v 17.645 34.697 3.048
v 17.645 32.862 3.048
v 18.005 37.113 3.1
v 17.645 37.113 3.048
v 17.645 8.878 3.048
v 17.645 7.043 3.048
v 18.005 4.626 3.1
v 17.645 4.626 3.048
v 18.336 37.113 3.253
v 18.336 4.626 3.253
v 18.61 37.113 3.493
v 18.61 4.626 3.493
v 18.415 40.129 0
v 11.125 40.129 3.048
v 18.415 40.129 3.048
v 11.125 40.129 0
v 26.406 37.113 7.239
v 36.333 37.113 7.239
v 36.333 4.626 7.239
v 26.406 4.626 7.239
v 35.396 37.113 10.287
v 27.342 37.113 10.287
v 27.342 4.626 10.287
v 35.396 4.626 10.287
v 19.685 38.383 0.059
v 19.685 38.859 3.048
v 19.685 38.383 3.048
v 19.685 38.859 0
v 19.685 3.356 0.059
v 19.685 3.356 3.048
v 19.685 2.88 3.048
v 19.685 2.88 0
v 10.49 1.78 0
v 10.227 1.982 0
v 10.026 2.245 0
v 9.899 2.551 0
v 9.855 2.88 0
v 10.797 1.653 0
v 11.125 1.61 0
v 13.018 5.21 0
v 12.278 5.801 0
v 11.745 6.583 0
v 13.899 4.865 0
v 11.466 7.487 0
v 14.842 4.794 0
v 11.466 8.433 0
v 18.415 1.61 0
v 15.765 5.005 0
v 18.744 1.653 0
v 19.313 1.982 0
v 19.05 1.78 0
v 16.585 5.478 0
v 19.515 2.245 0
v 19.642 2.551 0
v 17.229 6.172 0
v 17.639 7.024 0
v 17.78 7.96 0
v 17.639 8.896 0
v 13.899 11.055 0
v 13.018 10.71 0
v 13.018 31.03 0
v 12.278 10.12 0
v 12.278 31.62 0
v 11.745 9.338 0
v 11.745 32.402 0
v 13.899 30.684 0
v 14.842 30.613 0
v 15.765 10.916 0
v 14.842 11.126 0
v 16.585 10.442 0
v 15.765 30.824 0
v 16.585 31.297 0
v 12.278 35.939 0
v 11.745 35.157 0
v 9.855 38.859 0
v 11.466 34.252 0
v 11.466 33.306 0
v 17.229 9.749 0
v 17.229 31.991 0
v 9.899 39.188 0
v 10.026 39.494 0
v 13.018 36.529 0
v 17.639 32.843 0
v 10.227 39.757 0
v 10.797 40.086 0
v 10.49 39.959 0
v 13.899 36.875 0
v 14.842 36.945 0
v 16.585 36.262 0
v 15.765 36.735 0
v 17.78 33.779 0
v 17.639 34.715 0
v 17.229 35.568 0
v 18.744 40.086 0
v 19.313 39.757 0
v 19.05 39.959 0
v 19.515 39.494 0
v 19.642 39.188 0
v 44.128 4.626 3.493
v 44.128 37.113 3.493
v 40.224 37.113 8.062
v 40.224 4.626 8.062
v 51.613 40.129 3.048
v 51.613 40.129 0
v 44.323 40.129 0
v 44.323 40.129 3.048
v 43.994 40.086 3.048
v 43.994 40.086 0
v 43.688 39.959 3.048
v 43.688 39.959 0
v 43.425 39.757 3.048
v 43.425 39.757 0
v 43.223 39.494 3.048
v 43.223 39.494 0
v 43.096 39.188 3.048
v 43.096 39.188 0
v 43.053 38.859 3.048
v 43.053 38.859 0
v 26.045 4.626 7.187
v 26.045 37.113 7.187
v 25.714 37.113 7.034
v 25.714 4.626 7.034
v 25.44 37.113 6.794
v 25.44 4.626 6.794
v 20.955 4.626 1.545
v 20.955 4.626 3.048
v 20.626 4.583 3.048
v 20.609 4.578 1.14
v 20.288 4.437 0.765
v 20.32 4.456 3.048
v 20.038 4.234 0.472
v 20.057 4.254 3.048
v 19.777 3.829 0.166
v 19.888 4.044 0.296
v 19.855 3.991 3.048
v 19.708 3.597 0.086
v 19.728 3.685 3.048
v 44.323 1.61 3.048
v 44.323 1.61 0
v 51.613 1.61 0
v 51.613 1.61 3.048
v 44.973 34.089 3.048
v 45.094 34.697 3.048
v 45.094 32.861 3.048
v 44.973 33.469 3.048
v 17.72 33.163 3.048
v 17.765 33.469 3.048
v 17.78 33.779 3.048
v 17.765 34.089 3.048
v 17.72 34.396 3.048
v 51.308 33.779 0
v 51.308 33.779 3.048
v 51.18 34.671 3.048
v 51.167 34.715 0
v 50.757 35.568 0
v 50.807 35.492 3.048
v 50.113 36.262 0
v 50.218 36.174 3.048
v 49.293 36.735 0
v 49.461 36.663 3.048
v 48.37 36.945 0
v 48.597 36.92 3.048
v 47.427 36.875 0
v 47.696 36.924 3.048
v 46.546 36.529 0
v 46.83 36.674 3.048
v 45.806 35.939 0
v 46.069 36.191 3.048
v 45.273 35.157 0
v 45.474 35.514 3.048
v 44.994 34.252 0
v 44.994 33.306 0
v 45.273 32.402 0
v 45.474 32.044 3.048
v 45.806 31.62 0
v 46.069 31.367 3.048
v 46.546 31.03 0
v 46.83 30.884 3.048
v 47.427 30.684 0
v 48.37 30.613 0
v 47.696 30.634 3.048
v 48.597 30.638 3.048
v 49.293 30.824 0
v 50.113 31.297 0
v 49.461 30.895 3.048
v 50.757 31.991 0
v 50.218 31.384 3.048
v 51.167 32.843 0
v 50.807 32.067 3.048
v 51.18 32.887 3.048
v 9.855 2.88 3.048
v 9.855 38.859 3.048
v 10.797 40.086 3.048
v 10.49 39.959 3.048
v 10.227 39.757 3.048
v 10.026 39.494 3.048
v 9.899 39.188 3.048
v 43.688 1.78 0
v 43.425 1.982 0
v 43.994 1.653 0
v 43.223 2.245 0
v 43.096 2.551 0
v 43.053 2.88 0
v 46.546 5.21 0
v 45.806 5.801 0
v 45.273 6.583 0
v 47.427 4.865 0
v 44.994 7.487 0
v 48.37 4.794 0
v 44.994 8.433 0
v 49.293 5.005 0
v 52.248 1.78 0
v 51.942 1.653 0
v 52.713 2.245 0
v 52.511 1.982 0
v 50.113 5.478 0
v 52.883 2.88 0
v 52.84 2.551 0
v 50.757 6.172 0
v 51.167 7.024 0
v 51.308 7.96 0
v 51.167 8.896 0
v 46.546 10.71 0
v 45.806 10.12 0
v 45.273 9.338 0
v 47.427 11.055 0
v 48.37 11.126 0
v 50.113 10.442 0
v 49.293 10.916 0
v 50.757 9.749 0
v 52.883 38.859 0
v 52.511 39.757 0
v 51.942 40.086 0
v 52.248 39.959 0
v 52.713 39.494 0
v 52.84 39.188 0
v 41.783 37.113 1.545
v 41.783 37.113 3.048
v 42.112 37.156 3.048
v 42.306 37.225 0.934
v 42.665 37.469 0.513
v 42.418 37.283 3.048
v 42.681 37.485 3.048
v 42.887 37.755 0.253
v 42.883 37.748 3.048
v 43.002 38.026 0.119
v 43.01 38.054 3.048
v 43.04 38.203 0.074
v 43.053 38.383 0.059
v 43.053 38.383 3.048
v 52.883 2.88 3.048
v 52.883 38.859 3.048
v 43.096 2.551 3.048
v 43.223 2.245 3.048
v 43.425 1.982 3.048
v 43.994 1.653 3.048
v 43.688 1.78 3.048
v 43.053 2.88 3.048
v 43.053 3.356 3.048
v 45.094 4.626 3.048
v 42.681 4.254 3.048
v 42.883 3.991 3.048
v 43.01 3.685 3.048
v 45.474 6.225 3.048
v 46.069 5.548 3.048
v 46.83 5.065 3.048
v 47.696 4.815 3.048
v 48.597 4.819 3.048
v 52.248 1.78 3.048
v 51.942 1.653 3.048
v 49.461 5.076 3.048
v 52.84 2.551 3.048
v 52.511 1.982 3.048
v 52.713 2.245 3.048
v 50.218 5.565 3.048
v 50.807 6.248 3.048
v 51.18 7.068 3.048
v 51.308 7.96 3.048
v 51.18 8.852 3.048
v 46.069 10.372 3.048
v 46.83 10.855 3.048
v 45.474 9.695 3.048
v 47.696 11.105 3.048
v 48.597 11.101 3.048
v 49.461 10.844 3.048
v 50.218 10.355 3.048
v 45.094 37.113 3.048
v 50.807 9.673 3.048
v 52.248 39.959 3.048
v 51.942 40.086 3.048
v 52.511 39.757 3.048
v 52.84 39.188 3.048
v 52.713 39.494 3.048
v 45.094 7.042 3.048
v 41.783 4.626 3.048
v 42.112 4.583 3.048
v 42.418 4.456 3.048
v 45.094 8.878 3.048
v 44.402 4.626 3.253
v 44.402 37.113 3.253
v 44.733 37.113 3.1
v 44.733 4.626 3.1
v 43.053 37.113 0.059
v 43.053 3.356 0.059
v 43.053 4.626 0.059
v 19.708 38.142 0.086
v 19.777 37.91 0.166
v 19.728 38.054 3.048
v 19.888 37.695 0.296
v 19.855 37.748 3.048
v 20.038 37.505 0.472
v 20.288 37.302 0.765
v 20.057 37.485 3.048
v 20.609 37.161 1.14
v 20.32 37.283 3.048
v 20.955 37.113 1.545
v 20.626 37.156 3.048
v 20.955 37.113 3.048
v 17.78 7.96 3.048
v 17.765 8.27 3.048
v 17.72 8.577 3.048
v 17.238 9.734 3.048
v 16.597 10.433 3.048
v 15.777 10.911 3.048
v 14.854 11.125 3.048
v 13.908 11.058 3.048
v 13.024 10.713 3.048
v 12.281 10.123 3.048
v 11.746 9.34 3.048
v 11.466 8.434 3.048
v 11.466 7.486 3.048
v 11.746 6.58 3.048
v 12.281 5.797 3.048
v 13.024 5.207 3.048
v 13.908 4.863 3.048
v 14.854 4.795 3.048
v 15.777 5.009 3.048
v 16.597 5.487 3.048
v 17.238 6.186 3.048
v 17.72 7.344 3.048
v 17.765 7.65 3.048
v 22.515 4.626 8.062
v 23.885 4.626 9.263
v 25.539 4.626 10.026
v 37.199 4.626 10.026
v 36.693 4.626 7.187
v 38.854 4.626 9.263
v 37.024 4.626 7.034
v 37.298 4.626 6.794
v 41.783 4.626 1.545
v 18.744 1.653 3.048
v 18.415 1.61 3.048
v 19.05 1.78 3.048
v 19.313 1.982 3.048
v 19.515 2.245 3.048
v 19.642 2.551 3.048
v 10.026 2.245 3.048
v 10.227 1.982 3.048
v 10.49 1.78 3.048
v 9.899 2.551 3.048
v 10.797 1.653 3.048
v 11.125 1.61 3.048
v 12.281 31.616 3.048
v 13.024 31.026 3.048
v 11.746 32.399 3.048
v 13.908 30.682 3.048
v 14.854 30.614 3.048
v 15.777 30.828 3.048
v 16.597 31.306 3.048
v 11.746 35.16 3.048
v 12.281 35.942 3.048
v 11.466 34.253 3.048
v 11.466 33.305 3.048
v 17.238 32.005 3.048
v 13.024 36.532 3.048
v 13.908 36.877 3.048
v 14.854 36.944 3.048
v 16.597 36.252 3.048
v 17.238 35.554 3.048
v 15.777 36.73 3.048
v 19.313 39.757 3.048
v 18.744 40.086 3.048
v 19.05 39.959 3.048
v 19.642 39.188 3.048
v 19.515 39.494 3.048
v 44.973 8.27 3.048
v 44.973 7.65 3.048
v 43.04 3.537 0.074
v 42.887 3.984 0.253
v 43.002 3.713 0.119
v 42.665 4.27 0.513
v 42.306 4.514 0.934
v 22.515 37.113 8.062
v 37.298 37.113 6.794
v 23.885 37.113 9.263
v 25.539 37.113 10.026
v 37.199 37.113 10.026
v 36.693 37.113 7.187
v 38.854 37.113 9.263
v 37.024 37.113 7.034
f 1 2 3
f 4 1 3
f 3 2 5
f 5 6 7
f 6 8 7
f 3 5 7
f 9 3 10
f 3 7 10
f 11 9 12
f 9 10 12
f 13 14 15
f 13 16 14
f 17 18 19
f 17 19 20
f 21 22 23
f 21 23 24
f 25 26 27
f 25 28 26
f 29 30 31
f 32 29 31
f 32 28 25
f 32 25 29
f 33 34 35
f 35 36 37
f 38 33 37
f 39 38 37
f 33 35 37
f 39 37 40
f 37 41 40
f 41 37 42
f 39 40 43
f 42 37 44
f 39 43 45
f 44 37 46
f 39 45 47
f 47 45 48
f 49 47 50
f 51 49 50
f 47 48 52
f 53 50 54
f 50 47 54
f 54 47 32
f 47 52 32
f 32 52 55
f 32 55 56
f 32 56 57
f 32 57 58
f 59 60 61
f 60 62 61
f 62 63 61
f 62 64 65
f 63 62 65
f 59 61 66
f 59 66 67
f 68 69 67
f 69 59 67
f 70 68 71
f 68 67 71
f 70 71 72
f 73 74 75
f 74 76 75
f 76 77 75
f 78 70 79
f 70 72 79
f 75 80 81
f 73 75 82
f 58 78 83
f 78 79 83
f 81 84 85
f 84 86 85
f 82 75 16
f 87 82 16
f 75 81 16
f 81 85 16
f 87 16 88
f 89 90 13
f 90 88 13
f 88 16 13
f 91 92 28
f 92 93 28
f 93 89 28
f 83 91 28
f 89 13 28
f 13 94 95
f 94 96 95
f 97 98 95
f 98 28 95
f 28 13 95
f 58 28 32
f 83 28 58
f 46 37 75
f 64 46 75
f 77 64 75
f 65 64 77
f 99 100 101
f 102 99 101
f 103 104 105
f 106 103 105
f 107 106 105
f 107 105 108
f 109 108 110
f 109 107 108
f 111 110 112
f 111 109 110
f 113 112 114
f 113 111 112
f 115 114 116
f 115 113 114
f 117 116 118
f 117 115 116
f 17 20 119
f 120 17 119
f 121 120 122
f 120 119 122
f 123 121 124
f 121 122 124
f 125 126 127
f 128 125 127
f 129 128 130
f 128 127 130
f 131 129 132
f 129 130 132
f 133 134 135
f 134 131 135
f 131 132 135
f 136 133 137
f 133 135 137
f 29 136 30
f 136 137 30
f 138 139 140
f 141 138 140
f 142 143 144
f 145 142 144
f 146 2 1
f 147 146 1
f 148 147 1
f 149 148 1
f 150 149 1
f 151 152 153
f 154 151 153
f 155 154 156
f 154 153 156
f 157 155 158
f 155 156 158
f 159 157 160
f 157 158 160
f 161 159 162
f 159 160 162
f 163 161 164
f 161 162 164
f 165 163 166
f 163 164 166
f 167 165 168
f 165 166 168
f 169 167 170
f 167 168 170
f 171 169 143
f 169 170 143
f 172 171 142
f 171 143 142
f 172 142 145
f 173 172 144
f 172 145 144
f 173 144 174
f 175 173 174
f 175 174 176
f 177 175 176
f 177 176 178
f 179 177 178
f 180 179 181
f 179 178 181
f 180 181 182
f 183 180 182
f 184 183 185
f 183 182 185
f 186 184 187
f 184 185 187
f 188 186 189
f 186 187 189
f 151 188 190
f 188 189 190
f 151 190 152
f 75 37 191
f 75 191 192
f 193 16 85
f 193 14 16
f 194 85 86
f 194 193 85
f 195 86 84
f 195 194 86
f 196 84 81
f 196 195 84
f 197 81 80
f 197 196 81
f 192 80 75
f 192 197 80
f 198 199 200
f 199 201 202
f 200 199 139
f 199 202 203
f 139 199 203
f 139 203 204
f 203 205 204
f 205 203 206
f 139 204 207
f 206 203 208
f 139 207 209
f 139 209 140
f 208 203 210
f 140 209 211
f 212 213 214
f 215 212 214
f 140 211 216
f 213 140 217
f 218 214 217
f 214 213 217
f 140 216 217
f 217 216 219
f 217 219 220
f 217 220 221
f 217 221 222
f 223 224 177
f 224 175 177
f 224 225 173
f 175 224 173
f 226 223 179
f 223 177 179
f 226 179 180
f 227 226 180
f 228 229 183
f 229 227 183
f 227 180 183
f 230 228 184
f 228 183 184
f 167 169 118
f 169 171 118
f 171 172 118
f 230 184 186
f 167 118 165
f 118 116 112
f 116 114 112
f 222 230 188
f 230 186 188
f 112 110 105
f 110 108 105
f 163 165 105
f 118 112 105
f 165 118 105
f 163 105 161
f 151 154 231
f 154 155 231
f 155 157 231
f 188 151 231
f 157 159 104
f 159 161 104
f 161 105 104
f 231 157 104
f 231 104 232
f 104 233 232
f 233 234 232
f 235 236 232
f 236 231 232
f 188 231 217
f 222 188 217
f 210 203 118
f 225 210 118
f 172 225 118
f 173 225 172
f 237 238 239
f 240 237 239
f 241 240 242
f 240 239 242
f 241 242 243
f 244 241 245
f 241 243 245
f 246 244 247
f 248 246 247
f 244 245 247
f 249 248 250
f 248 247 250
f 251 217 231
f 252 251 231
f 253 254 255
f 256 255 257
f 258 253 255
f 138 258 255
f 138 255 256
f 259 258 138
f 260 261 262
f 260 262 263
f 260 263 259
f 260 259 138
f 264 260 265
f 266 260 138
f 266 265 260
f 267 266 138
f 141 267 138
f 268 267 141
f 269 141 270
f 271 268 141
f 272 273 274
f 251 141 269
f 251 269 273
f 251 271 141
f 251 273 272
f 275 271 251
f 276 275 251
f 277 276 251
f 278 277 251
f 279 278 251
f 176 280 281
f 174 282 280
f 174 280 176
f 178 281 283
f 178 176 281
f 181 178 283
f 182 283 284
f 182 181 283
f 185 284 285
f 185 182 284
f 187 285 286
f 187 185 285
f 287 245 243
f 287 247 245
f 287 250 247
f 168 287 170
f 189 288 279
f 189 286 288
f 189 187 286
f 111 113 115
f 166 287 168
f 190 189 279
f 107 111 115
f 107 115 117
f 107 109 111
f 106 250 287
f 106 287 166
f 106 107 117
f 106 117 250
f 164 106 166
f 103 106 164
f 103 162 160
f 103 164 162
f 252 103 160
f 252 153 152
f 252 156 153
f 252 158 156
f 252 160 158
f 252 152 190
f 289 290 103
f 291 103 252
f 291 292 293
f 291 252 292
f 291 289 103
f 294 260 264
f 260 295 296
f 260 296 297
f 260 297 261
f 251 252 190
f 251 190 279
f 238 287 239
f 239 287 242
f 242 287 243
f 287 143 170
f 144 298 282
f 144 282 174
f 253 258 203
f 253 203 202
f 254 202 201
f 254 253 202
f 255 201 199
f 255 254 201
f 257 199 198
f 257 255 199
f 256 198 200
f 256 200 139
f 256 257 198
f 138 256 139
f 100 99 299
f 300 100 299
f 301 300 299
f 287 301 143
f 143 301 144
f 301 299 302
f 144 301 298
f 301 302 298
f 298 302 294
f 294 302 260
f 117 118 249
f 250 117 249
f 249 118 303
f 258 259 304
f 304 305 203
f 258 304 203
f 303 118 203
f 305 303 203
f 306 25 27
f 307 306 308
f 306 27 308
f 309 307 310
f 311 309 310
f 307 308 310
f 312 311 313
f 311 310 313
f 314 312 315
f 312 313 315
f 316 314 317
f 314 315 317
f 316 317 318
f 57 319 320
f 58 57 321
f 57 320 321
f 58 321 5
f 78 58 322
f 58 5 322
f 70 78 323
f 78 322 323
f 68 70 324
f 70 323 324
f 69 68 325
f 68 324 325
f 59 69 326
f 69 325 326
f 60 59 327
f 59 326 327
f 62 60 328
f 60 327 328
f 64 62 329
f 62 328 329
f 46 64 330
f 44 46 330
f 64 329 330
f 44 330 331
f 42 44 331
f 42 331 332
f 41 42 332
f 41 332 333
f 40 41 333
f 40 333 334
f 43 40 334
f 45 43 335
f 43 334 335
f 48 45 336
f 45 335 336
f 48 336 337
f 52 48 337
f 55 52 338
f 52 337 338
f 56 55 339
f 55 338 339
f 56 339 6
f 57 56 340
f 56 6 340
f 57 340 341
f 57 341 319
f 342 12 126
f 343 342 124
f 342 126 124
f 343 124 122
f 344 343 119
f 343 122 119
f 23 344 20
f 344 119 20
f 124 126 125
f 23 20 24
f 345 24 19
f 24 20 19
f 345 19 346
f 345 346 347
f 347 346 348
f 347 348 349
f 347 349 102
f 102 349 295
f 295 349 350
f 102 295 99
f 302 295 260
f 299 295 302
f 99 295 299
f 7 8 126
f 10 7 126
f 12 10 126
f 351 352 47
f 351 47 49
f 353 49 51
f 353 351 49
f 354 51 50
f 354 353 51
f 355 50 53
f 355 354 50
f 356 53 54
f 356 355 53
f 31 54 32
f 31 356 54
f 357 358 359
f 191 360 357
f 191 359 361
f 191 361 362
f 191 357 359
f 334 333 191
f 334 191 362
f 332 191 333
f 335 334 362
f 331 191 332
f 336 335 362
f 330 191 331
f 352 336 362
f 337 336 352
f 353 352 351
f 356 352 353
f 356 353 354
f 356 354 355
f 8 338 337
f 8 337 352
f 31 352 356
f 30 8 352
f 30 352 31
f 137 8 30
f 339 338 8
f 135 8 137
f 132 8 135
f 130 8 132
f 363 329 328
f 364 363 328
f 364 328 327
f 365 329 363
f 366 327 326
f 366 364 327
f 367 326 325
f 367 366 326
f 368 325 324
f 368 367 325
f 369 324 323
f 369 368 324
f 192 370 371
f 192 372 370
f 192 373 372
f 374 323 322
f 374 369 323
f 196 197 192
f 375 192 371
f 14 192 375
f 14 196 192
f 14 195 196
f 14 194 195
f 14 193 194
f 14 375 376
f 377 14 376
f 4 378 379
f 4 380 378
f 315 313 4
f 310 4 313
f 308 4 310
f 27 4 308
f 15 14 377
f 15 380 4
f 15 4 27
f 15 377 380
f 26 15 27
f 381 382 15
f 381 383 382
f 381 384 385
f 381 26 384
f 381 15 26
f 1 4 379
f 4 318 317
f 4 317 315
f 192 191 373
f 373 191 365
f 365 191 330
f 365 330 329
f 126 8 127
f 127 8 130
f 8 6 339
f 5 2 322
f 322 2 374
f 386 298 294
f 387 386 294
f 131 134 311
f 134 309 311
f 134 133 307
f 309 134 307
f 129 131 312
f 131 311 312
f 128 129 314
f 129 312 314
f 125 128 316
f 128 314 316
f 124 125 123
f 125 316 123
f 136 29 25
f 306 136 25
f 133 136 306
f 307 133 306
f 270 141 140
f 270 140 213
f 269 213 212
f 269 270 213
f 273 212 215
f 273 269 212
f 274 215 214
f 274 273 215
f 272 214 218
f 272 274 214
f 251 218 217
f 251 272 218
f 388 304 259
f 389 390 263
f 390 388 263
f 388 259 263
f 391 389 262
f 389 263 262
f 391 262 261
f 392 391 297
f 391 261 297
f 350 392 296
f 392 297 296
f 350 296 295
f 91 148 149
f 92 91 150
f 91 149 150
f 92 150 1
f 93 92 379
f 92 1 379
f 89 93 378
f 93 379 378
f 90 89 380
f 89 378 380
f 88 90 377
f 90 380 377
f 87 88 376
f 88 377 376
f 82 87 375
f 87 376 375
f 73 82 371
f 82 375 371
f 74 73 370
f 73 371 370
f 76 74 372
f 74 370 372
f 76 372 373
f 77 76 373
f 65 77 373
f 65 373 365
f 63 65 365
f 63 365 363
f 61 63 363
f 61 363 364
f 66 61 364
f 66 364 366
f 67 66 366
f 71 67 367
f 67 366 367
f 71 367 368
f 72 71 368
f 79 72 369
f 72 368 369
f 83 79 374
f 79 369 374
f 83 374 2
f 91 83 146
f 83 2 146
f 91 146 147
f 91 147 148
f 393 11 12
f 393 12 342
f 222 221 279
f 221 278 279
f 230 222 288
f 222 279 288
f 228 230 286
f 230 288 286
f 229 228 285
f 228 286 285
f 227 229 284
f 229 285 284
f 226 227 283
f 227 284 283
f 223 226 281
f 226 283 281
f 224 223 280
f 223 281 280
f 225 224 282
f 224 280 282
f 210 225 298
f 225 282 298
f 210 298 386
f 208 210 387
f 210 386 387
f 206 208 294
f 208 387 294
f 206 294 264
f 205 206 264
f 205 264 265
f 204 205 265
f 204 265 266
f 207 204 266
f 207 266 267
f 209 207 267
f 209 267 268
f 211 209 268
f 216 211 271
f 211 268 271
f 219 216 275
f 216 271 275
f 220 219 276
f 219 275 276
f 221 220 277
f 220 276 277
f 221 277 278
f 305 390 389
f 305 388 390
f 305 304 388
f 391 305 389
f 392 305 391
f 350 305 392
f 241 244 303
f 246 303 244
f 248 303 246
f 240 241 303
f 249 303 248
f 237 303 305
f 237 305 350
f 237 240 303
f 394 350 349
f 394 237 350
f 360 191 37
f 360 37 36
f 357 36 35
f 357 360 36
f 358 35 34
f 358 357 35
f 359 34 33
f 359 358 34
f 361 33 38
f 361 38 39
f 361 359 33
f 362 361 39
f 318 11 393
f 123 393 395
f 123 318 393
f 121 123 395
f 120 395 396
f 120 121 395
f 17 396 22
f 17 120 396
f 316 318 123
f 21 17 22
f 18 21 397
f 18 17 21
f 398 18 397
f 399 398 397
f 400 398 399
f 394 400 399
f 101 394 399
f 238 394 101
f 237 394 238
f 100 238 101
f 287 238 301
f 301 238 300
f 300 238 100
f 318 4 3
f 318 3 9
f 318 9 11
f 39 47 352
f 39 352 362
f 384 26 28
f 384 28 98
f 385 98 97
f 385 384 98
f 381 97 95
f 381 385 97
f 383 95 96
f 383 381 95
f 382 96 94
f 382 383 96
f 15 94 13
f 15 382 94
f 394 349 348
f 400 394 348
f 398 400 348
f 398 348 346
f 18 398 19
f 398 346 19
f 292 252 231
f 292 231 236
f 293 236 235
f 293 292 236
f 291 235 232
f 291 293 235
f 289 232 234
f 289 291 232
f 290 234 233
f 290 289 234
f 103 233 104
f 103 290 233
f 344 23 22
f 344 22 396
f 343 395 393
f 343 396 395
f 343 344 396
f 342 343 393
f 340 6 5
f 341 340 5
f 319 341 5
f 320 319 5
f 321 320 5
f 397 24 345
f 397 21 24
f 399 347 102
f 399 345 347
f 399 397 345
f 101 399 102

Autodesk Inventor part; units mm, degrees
ref_plane "YZ Plane" through (0, 0, 0) normal (1, 0, 0) x (0, 1, 0)
ref_plane "XZ Plane" through (0, 0, 0) normal (0, 1, 0) x (-1, 0, 0)
ref_plane "XY Plane" through (0, 0, 0) normal (0, 0, 1) x (1, 0, 0)
sketch "Sketch1" plane through (0, 0, 0) normal (0, 0, 1) x (1, 0, 0)
  line L0 (38.3225, 4.6263) -> (24.416, 4.6263)
  line L1 (38.3225, 4.6263) -> (38.3225, 37.1129)
  line L2 (38.3225, 37.1129) -> (24.416, 37.1129)
  line L3 (24.416, 37.1129) -> (24.416, 4.6263)
  line L4 (9.8554, 1.6101) -> (9.8554, 40.1292)
  line L5 (9.8554, 40.1292) -> (19.6852, 40.1292)
  line L6 (19.6852, 40.1292) -> (19.6852, 1.6101)
  line L7 (19.6852, 1.6101) -> (9.8554, 1.6101)
  line L8 (31.3692, 4.6263) -> (31.3692, 37.1129)
  line L9 (52.883, 1.6101) -> (52.883, 40.1292)
  line L10 (52.883, 40.1292) -> (43.0532, 40.1292)
  line L11 (43.0532, 40.1292) -> (43.0532, 1.6101)
  line L12 (43.0532, 1.6101) -> (52.883, 1.6101)
  point P0 (0, 0)
  point P1 (9.8554, 20.8696)
  point P2 (52.883, 20.8696)
  dimension "d0" = 13.9065
  dimension "d1" = 32.4866
  dimension "d2" = 38.5191
  dimension "d3" = 16.2433
  dimension "d5" = 9.8298
  dimension "d31" = 43.0276
  dimension "d59" = 38.5191
extrude "Extrusion6" add sketch "Sketch1" along normal blind 3.048 contours L4 L5 L6 L7 | L12 L11 L10 L9
extrude "Extrusion7" add sketch "Sketch1" along normal blind 10.287 contours L0 L8 L2 L1 | L0 L3 L2 L8
sketch "Sketch6" plane through (24.416, 37.1129, 0) normal (0, 1, 0) x (1, 0, 0)
  line L0 (13.9065, 0) -> (0, 0) projected
  line L1 (0, 0) -> (0, -10.287) projected
  line L2 (13.9065, -10.287) -> (0, -10.287) projected
  line L3 (13.9065, 0) -> (13.9065, -10.287) projected
  line L4 (13.9065, -7.239) -> (0, -7.239)
  point P0 (-24.416, 0)
  dimension "d36" = 3.048
extrude "Extrusion8" cut sketch "Sketch6" against normal blind 50.8 contours L3 L4 L1 L0
sketch "Sketch7" plane through (24.416, 37.1129, 10.287) normal (0, 1, 0) x (1, 0, 0)
  line L0 (28.4671, 7.239) -> (18.6373, 7.239) projected
  line L1 (0, 0) -> (13.9065, 0) projected
  line L2 (20.4193, 12.3132) -> (10.4121, 0.6025)
  line L3 (23.3323, 11.0303) -> (13.9065, 0)
  line L4 (13.9065, 3.048) -> (13.9065, 0) projected
  line L5 (13.9065, 0) -> (10.4121, 0)
  line L6 (10.4121, 0.6025) -> (10.4121, 0)
  line L7 (28.4671, 10.287) -> (18.6373, 10.287) projected
  line L8 (18.6373, 10.287) -> (18.6373, 7.239) projected
  line L9 (28.4671, 7.239) -> (18.6373, 7.239) projected
  line L10 (28.4671, 10.287) -> (28.4671, 7.239) projected
  line L11 (13.9065, 3.048) -> (0, 3.048) projected
  line L12 (0, 3.048) -> (0, 0) projected
  line L13 (13.9065, 0) -> (0, 0) projected
  line L14 (13.9065, 3.048) -> (13.9065, 0) projected
  line L15 (6.9533, 0) -> (6.9533, 10.1633)
  line L16 (-14.5606, 7.239) -> (-4.7307, 7.239)
  line L17 (-6.5128, 12.3132) -> (3.4944, 0.6025)
  line L18 (-9.4258, 11.0303) -> (0, 0)
  line L19 (0, 0) -> (3.4944, 0)
  line L20 (3.4944, 0.6025) -> (3.4944, 0)
  line L21 (-14.5606, 10.287) -> (-4.7307, 10.287)
  point P0 (-24.416, 10.287)
  point P1 (1.4047, 3.048)
  point P2 (-4.7813, 10.287)
  point P3 (-8.7906, 10.287)
  point P4 (12.5018, 3.048)
  point P5 (20.0925, 7.239)
  point P6 (18.6373, 10.2278)
  dimension "d39" = 3.048
  dimension "d40" = 0
  dimension "d41" = 0
extrude "Extrusion9" add sketch "Sketch7" against normal blind 32.4866 contours L3 L4 L11 L2 L8 L0 | L11 L12 L18 L21 L17
sketch "Sketch8" plane through (0, 0, 3.048) normal (0, 0, 1) x (1, 0, 0)
  circle A0 centre (14.6052, 7.9601) radius 3.175
  line L0 (9.8554, 1.6101) -> (19.6852, 1.6101) projected
  circle A1 centre (14.6052, 33.7792) radius 3.175
  line L1 (19.6852, 40.1292) -> (9.8554, 40.1292) projected
  line L2 (38.3225, 37.1129) -> (24.416, 37.1129) projected
  line L3 (24.416, 37.1129) -> (24.416, 4.6263) projected
  line L4 (24.416, 4.6263) -> (38.3225, 4.6263) projected
  line L5 (38.3225, 4.6263) -> (38.3225, 37.1129) projected
  line L6 (38.3225, 37.1129) -> (24.416, 37.1129) projected
  line L7 (31.3692, 37.1129) -> (31.3692, 17.7925)
  line L8 (19.6852, 1.6101) -> (19.6852, 40.1292) projected
  line L9 (19.6852, 1.6101) -> (19.6852, 4.6263) projected
  circle A2 centre (48.1332, 7.9601) radius 3.175
  circle A3 centre (48.1332, 33.7792) radius 3.175
  point P0 (0, 0)
  point P1 (19.6852, 37.1129)
  point P2 (19.6852, 38.6211)
  dimension "d44" = 6.35
  dimension "d45" = 6.35
  dimension "d46" = 6.35
  dimension "d47" = 6.35
  dimension "d55" = 5.08
  dimension "d56" = 5.08
fillet "Fillet4" radius 1.27 12 edges at (9.8554, 40.1292, 1.524) (19.6852, 40.1292, 1.524) (19.6852, 37.1129, 1.5536) (43.0532, 37.1129, 1.5536) (43.0532, 40.1292, 1.524) (52.883, 40.1292, 1.524) (52.883, 1.6101, 1.524) (43.0532, 1.6101, 1.524) (9.8554, 1.6101, 1.524) (19.6852, 1.6101, 1.524) (19.6852, 4.6263, 1.5536) (43.0532, 4.6263, 1.5536)
fillet "Fillet5" radius 6.35 2 edges at (24.416, 20.8696, 10.287) (38.3225, 20.8696, 10.287)
fillet "Fillet6" radius 1.27 1 edges at (18.23, 20.8696, 3.048)
fillet "Fillet7" radius 1.27 1 edges at (44.5085, 20.8696, 3.048)
fillet "Fillet8" radius 1.27 2 edges at (25.8207, 20.8696, 7.239) (36.9178, 20.8696, 7.239)
extrude "Extrusion11" cut sketch "Sketch8" against normal blind 50.8 contours A0 | A1 | A2 | A3
properties part number "Wheel Bracket"
